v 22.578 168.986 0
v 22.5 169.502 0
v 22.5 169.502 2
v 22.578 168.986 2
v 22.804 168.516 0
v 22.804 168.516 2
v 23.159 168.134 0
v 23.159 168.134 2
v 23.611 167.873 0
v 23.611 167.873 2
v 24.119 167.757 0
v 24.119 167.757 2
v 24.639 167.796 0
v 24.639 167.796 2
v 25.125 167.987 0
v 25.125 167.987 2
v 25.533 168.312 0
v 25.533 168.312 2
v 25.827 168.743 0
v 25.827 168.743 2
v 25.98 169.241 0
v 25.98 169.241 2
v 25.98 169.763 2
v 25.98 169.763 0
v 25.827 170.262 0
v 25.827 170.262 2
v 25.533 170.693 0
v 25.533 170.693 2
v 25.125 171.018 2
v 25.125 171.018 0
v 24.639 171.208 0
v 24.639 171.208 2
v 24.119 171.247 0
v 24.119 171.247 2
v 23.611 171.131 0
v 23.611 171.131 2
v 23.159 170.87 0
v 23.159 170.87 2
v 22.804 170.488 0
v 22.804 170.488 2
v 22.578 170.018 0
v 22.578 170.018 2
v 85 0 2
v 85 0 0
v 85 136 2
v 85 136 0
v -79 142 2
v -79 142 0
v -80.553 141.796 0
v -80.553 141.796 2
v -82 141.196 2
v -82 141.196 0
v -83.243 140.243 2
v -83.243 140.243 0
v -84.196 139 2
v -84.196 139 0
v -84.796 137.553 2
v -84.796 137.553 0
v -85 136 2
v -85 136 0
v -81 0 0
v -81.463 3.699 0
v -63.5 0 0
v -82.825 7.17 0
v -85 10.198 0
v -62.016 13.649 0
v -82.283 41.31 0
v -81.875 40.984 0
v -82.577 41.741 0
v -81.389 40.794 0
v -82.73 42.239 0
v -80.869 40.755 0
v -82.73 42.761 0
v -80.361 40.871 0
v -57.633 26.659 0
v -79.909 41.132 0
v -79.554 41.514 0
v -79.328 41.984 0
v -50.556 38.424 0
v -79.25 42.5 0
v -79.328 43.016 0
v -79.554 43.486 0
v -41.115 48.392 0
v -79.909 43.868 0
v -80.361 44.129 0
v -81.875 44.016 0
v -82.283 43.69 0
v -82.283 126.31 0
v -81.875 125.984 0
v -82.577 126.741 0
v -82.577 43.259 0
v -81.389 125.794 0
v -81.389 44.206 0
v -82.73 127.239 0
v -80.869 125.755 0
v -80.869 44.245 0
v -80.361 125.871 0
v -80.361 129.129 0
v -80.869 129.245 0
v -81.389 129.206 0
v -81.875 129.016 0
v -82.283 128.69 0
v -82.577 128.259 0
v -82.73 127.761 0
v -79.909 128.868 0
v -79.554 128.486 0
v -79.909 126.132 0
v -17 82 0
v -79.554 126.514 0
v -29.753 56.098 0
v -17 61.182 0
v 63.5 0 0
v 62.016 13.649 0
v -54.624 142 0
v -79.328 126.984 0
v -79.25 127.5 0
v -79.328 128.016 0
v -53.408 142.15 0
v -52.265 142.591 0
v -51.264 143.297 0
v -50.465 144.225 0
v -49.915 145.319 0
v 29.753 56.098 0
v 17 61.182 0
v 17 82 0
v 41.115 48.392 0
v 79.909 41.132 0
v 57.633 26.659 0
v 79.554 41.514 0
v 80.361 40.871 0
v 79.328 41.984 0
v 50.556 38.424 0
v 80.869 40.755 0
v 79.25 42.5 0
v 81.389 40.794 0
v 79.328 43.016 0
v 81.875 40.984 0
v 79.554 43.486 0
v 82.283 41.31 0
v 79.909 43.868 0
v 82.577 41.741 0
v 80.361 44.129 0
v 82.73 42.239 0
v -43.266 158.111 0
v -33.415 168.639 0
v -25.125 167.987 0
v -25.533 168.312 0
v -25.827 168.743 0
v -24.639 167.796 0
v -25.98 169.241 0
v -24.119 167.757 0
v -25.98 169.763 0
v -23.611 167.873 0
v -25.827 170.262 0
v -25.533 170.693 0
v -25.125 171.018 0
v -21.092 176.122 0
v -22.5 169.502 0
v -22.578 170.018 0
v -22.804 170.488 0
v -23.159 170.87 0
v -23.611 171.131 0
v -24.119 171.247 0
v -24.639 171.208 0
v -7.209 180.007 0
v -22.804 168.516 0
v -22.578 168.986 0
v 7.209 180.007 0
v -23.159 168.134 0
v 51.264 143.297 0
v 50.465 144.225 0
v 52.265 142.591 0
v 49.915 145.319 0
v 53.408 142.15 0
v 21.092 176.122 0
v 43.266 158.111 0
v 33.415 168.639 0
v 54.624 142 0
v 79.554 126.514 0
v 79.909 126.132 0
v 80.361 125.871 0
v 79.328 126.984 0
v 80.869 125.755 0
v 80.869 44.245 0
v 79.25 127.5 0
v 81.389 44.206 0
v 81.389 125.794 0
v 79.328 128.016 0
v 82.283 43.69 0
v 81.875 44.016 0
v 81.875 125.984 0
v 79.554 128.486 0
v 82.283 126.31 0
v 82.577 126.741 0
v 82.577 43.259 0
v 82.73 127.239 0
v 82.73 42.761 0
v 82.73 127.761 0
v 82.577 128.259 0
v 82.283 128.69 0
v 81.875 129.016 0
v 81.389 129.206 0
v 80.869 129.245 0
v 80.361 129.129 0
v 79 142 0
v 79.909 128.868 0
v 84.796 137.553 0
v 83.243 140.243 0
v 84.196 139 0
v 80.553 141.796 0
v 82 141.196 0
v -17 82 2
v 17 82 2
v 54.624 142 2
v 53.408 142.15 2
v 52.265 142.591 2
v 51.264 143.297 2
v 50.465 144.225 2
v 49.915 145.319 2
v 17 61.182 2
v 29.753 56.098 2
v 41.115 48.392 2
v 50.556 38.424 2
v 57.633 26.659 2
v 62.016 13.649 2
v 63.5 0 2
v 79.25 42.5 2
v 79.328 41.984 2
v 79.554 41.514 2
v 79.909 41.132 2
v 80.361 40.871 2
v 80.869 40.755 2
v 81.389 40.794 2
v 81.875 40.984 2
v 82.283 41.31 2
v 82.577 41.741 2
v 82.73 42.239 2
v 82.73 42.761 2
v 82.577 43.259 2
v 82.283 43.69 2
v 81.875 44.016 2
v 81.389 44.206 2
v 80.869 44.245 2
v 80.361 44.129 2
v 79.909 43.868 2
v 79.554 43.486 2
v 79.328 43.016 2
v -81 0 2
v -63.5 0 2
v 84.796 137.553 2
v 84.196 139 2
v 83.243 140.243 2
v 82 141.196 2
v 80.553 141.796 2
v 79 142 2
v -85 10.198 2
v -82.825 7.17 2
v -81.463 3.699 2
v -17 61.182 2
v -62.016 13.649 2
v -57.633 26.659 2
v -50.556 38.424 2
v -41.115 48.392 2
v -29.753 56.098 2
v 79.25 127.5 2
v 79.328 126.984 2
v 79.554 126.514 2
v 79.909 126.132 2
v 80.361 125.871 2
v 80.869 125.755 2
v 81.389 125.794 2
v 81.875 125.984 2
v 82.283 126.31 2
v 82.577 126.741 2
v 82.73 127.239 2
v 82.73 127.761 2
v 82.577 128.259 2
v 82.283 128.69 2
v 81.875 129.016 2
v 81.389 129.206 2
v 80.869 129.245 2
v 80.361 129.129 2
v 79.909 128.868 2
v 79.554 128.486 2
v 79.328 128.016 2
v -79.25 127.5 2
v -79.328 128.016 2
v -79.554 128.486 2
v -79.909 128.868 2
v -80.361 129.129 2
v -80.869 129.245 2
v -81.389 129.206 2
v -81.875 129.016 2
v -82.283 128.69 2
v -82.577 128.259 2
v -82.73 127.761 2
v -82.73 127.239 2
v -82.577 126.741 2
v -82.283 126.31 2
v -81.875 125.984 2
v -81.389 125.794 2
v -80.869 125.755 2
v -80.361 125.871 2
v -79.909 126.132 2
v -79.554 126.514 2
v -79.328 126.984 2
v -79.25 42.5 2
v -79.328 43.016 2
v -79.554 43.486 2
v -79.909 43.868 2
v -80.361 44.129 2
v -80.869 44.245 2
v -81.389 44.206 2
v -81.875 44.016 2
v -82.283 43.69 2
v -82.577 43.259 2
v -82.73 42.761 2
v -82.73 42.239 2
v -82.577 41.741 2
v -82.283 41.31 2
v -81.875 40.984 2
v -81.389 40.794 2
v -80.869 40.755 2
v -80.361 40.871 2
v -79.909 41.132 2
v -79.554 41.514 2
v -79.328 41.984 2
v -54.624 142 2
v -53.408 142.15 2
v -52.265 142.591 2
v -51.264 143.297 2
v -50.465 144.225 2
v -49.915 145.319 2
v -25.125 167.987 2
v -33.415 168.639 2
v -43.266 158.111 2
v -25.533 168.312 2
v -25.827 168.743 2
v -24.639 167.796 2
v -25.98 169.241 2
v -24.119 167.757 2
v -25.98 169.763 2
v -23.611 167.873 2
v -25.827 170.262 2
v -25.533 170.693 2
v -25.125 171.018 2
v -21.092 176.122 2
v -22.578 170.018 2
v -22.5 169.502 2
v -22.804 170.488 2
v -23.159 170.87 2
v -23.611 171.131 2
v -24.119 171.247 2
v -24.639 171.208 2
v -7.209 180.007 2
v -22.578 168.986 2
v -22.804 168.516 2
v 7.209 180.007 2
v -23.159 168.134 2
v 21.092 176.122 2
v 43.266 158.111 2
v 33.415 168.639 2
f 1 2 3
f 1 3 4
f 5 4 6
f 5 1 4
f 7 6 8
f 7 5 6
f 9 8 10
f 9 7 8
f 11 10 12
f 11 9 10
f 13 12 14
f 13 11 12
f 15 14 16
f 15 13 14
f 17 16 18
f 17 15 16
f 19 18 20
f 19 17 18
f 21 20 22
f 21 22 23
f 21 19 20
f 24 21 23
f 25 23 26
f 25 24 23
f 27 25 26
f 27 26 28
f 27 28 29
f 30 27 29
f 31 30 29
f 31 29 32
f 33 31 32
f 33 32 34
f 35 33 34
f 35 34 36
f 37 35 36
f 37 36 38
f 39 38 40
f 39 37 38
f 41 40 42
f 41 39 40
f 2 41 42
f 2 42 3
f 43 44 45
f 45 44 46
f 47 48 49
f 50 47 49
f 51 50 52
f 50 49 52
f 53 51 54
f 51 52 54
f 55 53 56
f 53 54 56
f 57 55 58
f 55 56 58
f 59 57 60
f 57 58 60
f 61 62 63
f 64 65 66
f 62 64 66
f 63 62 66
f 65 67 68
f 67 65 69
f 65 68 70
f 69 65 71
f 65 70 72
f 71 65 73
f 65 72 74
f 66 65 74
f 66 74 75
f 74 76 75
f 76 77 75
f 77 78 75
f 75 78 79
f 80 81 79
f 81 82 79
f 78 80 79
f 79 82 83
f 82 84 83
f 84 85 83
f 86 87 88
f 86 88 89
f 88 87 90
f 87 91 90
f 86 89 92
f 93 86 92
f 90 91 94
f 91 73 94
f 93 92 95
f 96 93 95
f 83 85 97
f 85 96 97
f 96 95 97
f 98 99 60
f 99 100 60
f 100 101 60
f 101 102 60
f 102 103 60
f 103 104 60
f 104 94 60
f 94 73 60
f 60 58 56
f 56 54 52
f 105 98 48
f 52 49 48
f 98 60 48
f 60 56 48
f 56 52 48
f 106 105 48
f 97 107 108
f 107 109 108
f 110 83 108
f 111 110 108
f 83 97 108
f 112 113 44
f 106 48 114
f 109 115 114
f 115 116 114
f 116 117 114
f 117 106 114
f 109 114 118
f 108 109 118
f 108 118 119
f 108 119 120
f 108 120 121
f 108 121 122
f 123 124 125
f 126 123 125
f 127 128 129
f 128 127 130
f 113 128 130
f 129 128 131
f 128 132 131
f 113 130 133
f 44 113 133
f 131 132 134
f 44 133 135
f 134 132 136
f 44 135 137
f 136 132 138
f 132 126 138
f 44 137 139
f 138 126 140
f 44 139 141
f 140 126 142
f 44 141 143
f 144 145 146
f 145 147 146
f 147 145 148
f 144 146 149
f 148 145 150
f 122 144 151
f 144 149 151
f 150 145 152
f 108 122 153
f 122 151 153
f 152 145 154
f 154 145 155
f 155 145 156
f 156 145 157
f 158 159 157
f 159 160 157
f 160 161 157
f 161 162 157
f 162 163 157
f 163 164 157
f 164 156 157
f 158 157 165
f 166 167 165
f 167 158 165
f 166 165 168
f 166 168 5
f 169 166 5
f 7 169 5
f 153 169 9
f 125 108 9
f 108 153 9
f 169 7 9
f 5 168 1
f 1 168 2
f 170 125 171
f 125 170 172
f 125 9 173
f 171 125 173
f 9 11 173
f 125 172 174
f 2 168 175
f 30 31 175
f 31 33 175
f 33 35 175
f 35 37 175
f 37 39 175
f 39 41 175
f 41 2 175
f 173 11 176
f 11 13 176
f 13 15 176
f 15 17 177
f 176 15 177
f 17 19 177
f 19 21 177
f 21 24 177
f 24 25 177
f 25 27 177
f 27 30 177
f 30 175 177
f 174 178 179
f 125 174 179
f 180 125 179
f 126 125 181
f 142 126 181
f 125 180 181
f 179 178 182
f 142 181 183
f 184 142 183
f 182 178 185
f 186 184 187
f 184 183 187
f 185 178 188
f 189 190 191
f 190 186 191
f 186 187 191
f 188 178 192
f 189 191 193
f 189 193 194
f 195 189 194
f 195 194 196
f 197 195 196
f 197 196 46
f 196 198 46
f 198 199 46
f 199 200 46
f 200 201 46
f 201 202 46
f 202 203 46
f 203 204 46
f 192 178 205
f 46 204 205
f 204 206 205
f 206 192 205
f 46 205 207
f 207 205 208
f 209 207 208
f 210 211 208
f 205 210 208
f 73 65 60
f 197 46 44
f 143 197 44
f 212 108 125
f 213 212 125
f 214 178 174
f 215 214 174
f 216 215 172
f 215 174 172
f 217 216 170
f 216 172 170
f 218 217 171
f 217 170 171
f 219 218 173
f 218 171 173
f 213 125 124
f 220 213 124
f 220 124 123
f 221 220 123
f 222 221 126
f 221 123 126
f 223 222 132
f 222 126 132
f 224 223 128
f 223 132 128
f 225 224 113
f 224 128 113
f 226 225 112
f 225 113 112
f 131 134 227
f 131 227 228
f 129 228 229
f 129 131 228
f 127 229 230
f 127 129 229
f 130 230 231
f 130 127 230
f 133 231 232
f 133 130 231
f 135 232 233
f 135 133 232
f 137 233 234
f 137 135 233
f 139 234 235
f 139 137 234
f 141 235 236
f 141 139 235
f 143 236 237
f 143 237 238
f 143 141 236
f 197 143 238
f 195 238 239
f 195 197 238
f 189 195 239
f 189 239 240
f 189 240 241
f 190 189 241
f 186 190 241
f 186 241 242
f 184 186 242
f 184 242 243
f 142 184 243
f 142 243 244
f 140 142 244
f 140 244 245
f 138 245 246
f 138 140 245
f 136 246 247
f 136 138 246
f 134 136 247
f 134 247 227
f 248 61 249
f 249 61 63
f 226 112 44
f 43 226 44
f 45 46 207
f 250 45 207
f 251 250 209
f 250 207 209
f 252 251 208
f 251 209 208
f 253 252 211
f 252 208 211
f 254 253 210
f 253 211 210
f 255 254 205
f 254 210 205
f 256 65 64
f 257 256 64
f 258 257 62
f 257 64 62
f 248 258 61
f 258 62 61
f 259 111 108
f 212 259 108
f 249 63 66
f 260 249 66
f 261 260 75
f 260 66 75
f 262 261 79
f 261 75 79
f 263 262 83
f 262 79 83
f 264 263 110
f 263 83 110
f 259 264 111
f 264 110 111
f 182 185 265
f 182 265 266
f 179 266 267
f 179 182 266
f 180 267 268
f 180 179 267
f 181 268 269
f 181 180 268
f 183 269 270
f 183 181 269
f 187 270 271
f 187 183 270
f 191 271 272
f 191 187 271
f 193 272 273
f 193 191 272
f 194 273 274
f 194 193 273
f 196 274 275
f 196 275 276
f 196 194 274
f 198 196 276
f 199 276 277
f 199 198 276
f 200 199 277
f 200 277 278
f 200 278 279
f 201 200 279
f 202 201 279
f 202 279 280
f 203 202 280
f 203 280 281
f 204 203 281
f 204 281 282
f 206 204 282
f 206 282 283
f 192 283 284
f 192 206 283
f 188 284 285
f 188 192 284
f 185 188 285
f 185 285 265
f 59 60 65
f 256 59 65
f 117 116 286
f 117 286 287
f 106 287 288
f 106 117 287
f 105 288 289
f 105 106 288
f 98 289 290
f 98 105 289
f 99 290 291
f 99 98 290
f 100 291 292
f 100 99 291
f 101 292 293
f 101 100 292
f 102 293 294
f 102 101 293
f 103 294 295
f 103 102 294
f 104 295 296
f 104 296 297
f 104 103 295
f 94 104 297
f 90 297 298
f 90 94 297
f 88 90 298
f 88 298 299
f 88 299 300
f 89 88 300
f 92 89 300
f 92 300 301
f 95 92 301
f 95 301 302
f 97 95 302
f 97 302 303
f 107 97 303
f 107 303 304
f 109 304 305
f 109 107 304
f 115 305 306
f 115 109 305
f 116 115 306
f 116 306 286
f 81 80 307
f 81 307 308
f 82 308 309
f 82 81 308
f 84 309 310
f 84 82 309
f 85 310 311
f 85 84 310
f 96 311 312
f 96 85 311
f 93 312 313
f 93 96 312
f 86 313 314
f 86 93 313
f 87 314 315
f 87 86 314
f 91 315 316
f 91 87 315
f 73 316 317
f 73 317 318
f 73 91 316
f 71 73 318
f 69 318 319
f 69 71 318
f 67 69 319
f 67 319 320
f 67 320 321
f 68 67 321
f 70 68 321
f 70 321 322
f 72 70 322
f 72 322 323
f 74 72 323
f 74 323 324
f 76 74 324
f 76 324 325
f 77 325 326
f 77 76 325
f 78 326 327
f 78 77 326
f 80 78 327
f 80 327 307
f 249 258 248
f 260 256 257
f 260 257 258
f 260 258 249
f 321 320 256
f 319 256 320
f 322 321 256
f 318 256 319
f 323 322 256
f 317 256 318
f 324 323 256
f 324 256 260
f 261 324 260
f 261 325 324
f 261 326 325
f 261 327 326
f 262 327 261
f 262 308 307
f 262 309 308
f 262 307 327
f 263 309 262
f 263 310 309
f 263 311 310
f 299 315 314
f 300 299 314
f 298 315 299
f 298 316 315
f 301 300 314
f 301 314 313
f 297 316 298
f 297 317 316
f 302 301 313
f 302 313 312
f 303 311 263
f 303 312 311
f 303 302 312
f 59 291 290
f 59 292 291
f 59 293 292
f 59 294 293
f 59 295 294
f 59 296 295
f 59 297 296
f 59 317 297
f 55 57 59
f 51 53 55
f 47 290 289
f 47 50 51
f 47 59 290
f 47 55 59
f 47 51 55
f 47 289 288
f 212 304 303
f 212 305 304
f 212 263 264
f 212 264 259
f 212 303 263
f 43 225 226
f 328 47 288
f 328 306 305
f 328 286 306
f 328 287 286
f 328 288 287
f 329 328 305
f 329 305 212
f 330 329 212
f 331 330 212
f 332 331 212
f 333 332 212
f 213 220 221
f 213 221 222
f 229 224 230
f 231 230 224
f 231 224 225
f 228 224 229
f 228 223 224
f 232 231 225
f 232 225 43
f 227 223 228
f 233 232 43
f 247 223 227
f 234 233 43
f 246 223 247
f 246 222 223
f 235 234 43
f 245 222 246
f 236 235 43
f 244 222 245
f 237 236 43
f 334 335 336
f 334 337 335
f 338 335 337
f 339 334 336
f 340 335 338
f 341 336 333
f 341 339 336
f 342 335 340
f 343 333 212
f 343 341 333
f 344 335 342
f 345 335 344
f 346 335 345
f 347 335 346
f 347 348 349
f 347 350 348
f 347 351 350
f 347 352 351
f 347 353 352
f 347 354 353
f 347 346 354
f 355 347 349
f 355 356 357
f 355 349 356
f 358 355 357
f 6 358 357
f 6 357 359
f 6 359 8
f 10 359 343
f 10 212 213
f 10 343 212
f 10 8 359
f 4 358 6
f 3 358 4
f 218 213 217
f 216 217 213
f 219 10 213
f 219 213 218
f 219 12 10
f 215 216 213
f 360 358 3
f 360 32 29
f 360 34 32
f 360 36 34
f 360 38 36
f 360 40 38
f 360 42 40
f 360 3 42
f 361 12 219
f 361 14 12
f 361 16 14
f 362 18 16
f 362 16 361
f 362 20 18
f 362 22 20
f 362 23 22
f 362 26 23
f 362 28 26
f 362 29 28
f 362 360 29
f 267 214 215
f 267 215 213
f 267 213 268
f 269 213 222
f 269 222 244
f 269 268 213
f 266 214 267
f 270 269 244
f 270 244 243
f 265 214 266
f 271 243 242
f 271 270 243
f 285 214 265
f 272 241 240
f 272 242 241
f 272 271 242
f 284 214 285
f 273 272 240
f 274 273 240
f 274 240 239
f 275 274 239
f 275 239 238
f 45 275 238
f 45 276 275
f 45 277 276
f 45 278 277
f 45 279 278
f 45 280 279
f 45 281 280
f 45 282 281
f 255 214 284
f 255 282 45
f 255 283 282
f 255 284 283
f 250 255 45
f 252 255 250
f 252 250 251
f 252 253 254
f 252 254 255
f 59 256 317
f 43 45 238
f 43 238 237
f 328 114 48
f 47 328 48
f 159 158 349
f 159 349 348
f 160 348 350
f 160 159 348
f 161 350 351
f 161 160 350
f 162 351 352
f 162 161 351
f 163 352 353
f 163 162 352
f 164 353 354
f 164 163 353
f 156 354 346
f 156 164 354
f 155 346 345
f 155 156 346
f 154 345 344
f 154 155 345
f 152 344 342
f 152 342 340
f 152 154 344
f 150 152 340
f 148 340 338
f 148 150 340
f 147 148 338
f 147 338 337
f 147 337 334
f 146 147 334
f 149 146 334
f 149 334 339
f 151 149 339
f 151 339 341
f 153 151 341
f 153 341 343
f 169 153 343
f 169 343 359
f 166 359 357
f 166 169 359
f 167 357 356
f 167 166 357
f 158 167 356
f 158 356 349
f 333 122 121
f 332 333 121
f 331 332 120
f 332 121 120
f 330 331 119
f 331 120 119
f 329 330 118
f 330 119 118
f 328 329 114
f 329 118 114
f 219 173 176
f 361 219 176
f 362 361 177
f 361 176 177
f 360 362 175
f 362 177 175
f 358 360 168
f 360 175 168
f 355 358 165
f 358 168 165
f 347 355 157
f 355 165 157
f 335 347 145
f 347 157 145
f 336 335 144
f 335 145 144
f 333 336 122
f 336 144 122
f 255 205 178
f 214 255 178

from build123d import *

# Parameters (mm, degrees)
ESQUISSE1_R      = 1.75
EXTRUSION1_DEPTH = 2


with BuildPart() as part:
    # Esquisse1 → Extrusion1 (new body)
    with BuildSketch(Plane.XY):
        with BuildLine():
            Line((79, 142), (54.623712799, 142))
            ThreePointArc((54.623712799, 142), (51.743189619, 142.913120236), (49.914772041, 145.318965517))
            ThreePointArc((49.914772041, 145.318965517), (0, 180.5), (-49.914772041, 145.318965517))
            ThreePointArc((-49.914772041, 145.318965517), (-51.743189619, 142.913120236), (-54.623712799, 142))
            Line((-54.623712799, 142), (-79, 142))
            ThreePointArc((-79, 142), (-83.242640687, 140.242640687), (-85, 136))
            Line((-85, 136), (-85, 10.198039027))
            ThreePointArc((-85, 10.198039027), (-82.035759956, 5.477225575), (-81, 0))
            Line((-81, 0), (-63.5, 0))
            ThreePointArc((-63.5, 0), (-50.555662393, 38.423625545), (-17, 61.182105227))
            Line((-17, 61.182105227), (-17, 82))
            Line((-17, 82), (17, 82))
            Line((17, 82), (17, 61.182105227))
            ThreePointArc((17, 61.182105227), (50.555662393, 38.423625545), (63.5, 0))
            Line((63.5, 0), (85, 0))
            Line((85, 0), (85, 136))
            ThreePointArc((85, 136), (83.242640687, 140.242640687), (79, 142))
        make_face()
        with Locations((-81, 42.5)):
            Circle(ESQUISSE1_R, mode=Mode.SUBTRACT)
        with Locations((-81, 127.5)):
            Circle(ESQUISSE1_R, mode=Mode.SUBTRACT)
        with Locations((-24.25, 169.502232084)):
            Circle(ESQUISSE1_R, mode=Mode.SUBTRACT)
        with Locations(Location((24.25, 169.502232084, 0), (0, 0, 180))):
            Circle(ESQUISSE1_R, mode=Mode.SUBTRACT)
        with Locations(Location((81, 127.5, 0), (0, 0, 180))):
            Circle(ESQUISSE1_R, mode=Mode.SUBTRACT)
        with Locations(Location((81, 42.5, 0), (0, 0, 180))):
            Circle(ESQUISSE1_R, mode=Mode.SUBTRACT)
    extrude(amount=EXTRUSION1_DEPTH)


solid = part.part
